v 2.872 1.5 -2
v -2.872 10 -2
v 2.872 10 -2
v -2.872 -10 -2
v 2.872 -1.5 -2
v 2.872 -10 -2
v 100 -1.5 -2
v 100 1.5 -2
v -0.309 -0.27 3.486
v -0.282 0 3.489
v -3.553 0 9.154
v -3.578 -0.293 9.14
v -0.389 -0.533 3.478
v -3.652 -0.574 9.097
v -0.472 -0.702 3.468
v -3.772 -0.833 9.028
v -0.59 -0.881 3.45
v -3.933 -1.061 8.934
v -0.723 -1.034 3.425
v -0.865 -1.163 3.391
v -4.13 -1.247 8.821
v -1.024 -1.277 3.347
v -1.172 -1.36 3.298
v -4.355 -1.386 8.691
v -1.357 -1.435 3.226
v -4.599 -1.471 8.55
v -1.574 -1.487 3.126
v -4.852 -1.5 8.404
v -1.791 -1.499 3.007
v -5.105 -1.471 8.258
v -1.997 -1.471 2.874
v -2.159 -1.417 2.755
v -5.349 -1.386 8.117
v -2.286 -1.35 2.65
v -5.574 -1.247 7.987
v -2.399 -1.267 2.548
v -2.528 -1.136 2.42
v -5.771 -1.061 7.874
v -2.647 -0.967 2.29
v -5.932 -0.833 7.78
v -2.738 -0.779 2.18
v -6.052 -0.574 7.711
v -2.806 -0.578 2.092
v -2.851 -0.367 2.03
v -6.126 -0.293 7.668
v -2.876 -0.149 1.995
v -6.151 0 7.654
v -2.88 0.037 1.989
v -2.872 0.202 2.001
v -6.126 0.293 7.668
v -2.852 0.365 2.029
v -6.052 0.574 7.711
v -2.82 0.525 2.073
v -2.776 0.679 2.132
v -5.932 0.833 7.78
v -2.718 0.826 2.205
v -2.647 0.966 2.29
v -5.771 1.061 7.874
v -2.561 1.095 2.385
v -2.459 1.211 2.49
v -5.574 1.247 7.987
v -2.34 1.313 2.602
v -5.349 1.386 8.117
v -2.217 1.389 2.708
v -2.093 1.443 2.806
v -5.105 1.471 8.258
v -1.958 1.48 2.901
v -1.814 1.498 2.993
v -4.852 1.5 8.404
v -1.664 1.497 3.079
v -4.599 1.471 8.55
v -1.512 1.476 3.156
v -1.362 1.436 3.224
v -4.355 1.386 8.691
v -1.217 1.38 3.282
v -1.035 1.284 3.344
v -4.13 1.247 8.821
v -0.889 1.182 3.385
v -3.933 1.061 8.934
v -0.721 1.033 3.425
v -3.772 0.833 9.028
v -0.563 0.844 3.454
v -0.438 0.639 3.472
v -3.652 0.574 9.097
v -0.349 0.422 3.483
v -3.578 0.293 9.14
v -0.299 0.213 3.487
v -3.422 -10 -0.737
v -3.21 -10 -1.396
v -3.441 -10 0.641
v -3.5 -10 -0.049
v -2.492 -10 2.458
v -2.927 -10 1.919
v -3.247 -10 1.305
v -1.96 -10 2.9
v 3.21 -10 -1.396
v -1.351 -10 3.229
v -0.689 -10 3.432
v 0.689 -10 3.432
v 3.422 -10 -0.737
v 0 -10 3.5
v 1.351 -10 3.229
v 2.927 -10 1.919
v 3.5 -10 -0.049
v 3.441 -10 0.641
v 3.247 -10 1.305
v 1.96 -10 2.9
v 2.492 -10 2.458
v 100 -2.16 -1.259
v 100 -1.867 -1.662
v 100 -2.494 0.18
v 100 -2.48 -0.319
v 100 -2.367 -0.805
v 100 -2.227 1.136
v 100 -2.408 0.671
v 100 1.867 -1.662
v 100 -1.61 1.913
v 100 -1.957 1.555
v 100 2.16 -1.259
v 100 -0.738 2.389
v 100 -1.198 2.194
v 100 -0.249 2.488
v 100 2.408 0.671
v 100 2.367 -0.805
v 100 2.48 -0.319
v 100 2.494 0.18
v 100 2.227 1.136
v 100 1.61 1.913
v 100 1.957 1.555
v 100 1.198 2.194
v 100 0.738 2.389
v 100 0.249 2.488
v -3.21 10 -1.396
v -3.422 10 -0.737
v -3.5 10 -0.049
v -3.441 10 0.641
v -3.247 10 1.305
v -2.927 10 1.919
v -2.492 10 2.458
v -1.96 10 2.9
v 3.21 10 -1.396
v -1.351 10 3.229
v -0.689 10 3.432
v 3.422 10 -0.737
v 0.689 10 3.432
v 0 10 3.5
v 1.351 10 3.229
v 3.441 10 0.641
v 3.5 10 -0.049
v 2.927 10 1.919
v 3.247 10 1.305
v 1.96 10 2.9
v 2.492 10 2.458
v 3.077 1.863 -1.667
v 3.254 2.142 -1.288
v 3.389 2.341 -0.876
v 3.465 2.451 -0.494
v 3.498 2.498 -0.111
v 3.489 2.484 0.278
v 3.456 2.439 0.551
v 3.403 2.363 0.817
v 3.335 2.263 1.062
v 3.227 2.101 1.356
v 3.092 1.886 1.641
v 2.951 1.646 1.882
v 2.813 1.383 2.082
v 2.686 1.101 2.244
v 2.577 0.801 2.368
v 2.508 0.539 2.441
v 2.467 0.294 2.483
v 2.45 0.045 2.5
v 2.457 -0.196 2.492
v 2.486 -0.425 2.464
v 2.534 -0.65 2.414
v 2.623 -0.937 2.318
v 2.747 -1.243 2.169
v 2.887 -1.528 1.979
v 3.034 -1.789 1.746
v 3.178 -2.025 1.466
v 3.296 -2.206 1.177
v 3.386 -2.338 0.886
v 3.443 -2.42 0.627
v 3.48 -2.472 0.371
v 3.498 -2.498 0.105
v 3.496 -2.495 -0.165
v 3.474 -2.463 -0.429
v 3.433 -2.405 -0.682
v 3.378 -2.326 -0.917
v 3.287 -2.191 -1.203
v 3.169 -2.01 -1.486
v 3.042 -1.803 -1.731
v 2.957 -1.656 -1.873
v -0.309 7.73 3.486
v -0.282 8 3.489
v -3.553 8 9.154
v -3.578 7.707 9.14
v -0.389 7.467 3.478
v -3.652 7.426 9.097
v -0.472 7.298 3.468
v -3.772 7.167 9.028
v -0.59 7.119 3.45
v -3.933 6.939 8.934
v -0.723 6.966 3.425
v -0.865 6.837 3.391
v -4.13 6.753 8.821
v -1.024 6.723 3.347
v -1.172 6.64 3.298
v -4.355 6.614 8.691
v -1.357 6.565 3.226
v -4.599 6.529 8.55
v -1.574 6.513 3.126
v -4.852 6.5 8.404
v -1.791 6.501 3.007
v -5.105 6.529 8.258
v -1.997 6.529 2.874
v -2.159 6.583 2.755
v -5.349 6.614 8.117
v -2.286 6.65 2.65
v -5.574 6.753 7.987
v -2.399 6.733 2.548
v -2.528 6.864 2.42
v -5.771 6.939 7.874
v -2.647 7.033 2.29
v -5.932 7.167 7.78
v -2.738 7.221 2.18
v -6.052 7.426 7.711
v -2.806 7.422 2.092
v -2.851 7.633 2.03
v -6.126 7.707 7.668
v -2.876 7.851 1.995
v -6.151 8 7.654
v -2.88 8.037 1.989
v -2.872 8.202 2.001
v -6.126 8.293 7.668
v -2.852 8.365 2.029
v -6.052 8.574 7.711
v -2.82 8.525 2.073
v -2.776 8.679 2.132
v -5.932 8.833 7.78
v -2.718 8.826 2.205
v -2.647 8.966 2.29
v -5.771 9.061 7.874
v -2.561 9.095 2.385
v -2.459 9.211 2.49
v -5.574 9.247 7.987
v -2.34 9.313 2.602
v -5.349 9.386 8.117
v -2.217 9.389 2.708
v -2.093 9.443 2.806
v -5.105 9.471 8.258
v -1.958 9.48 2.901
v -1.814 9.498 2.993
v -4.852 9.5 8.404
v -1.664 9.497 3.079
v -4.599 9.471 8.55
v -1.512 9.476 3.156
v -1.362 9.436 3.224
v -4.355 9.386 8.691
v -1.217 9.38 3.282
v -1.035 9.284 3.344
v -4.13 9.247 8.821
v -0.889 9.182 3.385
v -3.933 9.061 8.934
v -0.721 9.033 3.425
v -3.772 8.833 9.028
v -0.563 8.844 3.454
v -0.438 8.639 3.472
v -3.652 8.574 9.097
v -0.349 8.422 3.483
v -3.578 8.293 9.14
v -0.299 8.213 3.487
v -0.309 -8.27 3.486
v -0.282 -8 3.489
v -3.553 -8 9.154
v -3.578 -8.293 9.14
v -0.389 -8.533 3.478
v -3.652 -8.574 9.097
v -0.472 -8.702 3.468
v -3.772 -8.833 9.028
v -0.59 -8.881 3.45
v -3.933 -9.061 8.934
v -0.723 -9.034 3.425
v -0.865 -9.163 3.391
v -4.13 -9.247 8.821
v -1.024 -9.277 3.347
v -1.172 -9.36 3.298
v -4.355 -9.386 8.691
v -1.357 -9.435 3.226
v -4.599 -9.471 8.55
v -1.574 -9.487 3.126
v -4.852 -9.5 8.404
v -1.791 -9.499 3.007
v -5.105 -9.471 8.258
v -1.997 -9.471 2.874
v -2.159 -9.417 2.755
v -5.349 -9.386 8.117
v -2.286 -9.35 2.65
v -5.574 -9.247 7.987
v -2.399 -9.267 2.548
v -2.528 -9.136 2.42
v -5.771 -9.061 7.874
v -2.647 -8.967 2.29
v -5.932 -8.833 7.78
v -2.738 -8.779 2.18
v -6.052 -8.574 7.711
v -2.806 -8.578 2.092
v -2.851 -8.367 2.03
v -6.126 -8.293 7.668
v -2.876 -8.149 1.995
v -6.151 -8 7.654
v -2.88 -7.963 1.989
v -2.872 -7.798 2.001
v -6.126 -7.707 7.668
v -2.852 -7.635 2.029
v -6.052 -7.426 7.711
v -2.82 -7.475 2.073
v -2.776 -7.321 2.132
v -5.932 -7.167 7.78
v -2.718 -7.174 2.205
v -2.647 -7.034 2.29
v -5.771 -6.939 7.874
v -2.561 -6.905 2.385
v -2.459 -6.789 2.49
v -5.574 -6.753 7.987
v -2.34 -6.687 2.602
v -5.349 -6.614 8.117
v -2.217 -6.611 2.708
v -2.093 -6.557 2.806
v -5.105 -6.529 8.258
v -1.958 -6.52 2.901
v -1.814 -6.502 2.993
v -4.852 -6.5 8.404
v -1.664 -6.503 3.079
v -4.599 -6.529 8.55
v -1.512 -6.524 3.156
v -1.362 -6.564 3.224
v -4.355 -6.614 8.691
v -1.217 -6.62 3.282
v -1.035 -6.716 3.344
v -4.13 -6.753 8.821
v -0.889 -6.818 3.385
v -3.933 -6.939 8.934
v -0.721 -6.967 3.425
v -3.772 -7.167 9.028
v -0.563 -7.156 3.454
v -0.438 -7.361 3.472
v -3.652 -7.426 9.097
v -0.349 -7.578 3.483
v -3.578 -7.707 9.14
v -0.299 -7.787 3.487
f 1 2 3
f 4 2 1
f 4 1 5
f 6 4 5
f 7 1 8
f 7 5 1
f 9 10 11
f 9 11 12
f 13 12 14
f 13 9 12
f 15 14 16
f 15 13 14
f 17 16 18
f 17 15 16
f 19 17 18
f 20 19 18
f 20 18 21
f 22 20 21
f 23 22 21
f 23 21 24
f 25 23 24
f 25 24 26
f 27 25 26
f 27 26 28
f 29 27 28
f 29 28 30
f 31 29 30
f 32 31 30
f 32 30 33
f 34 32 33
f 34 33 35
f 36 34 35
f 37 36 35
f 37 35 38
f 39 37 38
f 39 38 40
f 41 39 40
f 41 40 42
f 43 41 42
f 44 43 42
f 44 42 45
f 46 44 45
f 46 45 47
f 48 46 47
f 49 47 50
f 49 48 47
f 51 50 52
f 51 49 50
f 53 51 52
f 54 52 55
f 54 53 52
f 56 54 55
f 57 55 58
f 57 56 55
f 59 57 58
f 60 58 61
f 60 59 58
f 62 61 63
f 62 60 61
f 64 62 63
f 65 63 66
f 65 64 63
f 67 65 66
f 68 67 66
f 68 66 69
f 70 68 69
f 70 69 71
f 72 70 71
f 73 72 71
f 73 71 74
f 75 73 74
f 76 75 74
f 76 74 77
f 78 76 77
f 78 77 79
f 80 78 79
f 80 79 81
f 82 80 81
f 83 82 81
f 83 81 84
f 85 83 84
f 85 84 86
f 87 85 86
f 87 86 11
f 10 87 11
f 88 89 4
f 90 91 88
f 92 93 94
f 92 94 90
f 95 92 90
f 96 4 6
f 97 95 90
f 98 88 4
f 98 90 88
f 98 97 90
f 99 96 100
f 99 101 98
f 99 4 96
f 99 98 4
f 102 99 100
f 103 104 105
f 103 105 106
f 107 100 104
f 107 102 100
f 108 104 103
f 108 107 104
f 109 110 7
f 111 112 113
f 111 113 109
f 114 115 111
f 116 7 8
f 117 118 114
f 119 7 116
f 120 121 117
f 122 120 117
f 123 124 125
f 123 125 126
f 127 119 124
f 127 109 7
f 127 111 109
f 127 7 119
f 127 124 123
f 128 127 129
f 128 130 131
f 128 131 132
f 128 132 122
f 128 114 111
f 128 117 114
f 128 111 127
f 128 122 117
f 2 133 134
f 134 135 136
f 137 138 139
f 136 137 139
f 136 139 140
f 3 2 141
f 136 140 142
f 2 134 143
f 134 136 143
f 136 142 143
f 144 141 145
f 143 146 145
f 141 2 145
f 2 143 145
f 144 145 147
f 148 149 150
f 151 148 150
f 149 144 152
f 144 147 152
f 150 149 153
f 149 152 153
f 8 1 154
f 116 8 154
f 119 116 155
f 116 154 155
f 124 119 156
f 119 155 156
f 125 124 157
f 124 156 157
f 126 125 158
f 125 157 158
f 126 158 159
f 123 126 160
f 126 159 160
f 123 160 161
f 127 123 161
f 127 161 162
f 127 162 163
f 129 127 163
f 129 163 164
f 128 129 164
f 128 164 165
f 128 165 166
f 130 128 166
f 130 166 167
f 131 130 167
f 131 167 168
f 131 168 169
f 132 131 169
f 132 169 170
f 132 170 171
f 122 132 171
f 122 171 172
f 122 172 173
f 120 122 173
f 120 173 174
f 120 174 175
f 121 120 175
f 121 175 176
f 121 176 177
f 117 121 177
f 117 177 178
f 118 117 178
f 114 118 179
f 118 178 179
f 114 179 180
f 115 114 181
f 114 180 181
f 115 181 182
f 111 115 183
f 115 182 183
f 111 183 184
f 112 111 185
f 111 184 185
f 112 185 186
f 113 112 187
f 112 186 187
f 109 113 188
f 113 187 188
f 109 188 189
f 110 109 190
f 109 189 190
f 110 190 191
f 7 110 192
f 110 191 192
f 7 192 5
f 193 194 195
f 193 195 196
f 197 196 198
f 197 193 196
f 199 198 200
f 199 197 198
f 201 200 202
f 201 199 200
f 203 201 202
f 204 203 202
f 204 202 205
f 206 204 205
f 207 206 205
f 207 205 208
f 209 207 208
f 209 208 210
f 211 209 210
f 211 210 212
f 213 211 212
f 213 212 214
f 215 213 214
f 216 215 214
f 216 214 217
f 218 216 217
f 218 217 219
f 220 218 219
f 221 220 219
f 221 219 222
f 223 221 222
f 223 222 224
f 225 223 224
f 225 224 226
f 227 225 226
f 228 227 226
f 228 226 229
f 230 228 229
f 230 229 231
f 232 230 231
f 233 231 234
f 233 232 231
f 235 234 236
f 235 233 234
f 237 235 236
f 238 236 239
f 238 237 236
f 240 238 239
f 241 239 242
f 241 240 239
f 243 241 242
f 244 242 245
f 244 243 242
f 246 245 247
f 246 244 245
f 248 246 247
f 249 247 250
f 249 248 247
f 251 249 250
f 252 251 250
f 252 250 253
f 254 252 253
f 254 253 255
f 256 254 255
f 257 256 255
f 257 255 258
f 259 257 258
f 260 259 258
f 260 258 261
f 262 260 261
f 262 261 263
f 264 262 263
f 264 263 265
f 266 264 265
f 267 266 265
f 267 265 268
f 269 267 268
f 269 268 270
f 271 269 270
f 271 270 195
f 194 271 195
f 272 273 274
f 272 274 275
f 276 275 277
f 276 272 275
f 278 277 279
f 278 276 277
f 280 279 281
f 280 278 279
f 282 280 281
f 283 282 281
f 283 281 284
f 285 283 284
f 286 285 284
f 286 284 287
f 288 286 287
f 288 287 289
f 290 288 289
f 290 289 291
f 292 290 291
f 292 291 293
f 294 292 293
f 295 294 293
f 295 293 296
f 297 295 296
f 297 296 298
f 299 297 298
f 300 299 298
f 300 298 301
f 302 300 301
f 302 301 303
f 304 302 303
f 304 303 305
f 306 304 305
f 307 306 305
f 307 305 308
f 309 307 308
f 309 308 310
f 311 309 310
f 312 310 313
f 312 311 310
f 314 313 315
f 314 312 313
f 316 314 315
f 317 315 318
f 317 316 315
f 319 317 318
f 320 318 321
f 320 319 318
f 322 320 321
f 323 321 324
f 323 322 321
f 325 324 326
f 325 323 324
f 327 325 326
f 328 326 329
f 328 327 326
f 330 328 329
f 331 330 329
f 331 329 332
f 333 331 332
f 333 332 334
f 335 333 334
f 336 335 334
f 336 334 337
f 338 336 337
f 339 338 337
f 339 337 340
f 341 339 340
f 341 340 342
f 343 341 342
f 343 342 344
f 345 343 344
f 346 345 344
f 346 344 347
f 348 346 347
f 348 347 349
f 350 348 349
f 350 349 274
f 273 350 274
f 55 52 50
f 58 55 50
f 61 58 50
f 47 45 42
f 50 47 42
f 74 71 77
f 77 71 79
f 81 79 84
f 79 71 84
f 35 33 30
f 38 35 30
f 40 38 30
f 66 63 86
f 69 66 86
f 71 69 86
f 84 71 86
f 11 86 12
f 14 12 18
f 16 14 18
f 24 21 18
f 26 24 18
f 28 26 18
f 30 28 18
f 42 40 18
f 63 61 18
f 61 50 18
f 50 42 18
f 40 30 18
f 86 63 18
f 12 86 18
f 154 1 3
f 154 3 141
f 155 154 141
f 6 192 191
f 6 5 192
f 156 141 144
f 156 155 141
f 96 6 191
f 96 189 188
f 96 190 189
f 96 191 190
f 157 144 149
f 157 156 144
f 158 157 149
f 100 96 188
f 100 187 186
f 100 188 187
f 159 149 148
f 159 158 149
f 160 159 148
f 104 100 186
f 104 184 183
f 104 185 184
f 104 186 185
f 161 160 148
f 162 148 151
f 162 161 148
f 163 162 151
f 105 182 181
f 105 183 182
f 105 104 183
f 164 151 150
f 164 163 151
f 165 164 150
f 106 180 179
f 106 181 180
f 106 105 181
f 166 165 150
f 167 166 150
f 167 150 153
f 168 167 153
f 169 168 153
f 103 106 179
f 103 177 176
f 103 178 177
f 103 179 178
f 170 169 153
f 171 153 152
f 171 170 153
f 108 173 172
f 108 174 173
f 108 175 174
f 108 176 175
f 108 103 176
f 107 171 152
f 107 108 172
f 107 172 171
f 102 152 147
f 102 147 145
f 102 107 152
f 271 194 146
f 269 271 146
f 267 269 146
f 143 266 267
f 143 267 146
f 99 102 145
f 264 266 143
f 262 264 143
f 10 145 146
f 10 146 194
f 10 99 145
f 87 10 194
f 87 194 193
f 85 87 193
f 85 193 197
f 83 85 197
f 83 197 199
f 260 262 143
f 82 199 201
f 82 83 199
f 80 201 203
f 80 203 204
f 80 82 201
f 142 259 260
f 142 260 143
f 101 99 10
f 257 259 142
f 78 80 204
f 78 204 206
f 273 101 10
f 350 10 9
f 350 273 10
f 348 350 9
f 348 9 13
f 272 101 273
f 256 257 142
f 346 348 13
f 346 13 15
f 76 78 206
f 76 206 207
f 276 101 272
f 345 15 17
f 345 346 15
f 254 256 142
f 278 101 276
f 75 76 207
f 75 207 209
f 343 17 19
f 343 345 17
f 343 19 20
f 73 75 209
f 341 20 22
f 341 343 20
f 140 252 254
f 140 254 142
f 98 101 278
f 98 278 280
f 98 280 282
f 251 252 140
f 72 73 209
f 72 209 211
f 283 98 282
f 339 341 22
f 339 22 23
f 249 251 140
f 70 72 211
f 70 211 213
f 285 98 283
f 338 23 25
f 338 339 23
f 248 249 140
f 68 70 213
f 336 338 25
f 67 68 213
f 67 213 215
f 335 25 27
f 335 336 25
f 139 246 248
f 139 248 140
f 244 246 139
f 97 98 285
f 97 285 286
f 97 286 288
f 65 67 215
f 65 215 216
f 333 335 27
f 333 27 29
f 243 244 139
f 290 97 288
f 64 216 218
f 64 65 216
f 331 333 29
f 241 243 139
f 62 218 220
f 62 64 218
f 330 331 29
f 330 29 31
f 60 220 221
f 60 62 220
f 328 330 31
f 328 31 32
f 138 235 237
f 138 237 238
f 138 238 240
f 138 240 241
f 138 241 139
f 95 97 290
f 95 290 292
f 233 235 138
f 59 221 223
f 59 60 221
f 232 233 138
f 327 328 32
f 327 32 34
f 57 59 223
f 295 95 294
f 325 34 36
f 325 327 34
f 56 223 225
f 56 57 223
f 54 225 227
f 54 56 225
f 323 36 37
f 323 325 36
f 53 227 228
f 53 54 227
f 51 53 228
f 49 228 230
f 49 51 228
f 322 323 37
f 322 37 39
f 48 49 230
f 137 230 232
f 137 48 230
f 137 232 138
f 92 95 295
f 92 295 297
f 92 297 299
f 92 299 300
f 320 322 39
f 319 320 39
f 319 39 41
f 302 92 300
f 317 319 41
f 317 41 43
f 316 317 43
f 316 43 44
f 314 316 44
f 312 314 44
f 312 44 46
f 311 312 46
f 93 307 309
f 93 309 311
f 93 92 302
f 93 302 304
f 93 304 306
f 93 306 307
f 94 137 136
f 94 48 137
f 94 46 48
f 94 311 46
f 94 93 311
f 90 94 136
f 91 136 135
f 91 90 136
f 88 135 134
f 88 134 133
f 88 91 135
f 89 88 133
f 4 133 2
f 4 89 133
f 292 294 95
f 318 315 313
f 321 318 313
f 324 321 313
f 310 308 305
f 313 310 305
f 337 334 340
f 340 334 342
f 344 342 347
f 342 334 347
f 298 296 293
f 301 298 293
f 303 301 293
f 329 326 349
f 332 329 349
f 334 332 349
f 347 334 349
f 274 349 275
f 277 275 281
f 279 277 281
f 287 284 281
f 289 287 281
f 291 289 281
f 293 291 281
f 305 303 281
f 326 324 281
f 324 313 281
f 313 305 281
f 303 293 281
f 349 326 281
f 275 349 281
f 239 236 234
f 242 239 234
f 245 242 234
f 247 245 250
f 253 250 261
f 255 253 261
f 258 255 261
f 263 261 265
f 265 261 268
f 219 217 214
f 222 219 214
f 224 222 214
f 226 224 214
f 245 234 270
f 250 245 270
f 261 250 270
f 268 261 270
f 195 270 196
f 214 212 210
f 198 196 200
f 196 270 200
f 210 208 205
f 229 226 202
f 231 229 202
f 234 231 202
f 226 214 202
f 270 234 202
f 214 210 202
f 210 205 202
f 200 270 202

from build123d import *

# Parameters (mm, degrees)
F1_DEPTH        = 10
F3_DEPTH        = 100
F5_R            = 1.5
F6_DEPTH        = 10
F6_COPIES_COUNT = 2
F6_COPIES_PITCH = 8


# Not quite as in the source:
# - a pattern or mirror of a feature is missing from the dataset's text; its kind, count and spacing are read off the source's solid


with BuildPart() as f1:
    # F0 (on Front) → F1 (new body, symmetric)
    with BuildSketch(Plane.XZ):
        with BuildLine():
            Line((-2.8722813233, -2), (2.8722813233, -2))
            ThreePointArc((2.8722813233, -2), (0, 3.5), (-2.8722813233, -2))
        make_face()
    extrude(amount=F1_DEPTH, both=True)

    # F2 (on Right) → F3 (join)
    with BuildSketch(Plane.YZ):
        with BuildLine():
            Line((-1.5, -2), (1.5, -2))
            ThreePointArc((1.5, -2), (0, 2.5), (-1.5, -2))
        make_face()
    extrude(amount=F3_DEPTH)

    # F5 (on face) → F6 (join)
    with BuildSketch(Plane(origin=(0.147955073, 0, -0.2562657036), x_dir=(0.8660254038, 0, 0.5), z_dir=(0.5, 0, -0.8660254038))):
        Circle(F5_R)
        with Locations((0, -8)):
            Circle(F5_R)
    f6 = extrude(amount=-F6_DEPTH)

    # F6_copies: F6 ×2
    with Locations(*[(0, -i * F6_COPIES_PITCH, 0) for i in range(1, F6_COPIES_COUNT)]):
        add(f6)


solid = f1.part
